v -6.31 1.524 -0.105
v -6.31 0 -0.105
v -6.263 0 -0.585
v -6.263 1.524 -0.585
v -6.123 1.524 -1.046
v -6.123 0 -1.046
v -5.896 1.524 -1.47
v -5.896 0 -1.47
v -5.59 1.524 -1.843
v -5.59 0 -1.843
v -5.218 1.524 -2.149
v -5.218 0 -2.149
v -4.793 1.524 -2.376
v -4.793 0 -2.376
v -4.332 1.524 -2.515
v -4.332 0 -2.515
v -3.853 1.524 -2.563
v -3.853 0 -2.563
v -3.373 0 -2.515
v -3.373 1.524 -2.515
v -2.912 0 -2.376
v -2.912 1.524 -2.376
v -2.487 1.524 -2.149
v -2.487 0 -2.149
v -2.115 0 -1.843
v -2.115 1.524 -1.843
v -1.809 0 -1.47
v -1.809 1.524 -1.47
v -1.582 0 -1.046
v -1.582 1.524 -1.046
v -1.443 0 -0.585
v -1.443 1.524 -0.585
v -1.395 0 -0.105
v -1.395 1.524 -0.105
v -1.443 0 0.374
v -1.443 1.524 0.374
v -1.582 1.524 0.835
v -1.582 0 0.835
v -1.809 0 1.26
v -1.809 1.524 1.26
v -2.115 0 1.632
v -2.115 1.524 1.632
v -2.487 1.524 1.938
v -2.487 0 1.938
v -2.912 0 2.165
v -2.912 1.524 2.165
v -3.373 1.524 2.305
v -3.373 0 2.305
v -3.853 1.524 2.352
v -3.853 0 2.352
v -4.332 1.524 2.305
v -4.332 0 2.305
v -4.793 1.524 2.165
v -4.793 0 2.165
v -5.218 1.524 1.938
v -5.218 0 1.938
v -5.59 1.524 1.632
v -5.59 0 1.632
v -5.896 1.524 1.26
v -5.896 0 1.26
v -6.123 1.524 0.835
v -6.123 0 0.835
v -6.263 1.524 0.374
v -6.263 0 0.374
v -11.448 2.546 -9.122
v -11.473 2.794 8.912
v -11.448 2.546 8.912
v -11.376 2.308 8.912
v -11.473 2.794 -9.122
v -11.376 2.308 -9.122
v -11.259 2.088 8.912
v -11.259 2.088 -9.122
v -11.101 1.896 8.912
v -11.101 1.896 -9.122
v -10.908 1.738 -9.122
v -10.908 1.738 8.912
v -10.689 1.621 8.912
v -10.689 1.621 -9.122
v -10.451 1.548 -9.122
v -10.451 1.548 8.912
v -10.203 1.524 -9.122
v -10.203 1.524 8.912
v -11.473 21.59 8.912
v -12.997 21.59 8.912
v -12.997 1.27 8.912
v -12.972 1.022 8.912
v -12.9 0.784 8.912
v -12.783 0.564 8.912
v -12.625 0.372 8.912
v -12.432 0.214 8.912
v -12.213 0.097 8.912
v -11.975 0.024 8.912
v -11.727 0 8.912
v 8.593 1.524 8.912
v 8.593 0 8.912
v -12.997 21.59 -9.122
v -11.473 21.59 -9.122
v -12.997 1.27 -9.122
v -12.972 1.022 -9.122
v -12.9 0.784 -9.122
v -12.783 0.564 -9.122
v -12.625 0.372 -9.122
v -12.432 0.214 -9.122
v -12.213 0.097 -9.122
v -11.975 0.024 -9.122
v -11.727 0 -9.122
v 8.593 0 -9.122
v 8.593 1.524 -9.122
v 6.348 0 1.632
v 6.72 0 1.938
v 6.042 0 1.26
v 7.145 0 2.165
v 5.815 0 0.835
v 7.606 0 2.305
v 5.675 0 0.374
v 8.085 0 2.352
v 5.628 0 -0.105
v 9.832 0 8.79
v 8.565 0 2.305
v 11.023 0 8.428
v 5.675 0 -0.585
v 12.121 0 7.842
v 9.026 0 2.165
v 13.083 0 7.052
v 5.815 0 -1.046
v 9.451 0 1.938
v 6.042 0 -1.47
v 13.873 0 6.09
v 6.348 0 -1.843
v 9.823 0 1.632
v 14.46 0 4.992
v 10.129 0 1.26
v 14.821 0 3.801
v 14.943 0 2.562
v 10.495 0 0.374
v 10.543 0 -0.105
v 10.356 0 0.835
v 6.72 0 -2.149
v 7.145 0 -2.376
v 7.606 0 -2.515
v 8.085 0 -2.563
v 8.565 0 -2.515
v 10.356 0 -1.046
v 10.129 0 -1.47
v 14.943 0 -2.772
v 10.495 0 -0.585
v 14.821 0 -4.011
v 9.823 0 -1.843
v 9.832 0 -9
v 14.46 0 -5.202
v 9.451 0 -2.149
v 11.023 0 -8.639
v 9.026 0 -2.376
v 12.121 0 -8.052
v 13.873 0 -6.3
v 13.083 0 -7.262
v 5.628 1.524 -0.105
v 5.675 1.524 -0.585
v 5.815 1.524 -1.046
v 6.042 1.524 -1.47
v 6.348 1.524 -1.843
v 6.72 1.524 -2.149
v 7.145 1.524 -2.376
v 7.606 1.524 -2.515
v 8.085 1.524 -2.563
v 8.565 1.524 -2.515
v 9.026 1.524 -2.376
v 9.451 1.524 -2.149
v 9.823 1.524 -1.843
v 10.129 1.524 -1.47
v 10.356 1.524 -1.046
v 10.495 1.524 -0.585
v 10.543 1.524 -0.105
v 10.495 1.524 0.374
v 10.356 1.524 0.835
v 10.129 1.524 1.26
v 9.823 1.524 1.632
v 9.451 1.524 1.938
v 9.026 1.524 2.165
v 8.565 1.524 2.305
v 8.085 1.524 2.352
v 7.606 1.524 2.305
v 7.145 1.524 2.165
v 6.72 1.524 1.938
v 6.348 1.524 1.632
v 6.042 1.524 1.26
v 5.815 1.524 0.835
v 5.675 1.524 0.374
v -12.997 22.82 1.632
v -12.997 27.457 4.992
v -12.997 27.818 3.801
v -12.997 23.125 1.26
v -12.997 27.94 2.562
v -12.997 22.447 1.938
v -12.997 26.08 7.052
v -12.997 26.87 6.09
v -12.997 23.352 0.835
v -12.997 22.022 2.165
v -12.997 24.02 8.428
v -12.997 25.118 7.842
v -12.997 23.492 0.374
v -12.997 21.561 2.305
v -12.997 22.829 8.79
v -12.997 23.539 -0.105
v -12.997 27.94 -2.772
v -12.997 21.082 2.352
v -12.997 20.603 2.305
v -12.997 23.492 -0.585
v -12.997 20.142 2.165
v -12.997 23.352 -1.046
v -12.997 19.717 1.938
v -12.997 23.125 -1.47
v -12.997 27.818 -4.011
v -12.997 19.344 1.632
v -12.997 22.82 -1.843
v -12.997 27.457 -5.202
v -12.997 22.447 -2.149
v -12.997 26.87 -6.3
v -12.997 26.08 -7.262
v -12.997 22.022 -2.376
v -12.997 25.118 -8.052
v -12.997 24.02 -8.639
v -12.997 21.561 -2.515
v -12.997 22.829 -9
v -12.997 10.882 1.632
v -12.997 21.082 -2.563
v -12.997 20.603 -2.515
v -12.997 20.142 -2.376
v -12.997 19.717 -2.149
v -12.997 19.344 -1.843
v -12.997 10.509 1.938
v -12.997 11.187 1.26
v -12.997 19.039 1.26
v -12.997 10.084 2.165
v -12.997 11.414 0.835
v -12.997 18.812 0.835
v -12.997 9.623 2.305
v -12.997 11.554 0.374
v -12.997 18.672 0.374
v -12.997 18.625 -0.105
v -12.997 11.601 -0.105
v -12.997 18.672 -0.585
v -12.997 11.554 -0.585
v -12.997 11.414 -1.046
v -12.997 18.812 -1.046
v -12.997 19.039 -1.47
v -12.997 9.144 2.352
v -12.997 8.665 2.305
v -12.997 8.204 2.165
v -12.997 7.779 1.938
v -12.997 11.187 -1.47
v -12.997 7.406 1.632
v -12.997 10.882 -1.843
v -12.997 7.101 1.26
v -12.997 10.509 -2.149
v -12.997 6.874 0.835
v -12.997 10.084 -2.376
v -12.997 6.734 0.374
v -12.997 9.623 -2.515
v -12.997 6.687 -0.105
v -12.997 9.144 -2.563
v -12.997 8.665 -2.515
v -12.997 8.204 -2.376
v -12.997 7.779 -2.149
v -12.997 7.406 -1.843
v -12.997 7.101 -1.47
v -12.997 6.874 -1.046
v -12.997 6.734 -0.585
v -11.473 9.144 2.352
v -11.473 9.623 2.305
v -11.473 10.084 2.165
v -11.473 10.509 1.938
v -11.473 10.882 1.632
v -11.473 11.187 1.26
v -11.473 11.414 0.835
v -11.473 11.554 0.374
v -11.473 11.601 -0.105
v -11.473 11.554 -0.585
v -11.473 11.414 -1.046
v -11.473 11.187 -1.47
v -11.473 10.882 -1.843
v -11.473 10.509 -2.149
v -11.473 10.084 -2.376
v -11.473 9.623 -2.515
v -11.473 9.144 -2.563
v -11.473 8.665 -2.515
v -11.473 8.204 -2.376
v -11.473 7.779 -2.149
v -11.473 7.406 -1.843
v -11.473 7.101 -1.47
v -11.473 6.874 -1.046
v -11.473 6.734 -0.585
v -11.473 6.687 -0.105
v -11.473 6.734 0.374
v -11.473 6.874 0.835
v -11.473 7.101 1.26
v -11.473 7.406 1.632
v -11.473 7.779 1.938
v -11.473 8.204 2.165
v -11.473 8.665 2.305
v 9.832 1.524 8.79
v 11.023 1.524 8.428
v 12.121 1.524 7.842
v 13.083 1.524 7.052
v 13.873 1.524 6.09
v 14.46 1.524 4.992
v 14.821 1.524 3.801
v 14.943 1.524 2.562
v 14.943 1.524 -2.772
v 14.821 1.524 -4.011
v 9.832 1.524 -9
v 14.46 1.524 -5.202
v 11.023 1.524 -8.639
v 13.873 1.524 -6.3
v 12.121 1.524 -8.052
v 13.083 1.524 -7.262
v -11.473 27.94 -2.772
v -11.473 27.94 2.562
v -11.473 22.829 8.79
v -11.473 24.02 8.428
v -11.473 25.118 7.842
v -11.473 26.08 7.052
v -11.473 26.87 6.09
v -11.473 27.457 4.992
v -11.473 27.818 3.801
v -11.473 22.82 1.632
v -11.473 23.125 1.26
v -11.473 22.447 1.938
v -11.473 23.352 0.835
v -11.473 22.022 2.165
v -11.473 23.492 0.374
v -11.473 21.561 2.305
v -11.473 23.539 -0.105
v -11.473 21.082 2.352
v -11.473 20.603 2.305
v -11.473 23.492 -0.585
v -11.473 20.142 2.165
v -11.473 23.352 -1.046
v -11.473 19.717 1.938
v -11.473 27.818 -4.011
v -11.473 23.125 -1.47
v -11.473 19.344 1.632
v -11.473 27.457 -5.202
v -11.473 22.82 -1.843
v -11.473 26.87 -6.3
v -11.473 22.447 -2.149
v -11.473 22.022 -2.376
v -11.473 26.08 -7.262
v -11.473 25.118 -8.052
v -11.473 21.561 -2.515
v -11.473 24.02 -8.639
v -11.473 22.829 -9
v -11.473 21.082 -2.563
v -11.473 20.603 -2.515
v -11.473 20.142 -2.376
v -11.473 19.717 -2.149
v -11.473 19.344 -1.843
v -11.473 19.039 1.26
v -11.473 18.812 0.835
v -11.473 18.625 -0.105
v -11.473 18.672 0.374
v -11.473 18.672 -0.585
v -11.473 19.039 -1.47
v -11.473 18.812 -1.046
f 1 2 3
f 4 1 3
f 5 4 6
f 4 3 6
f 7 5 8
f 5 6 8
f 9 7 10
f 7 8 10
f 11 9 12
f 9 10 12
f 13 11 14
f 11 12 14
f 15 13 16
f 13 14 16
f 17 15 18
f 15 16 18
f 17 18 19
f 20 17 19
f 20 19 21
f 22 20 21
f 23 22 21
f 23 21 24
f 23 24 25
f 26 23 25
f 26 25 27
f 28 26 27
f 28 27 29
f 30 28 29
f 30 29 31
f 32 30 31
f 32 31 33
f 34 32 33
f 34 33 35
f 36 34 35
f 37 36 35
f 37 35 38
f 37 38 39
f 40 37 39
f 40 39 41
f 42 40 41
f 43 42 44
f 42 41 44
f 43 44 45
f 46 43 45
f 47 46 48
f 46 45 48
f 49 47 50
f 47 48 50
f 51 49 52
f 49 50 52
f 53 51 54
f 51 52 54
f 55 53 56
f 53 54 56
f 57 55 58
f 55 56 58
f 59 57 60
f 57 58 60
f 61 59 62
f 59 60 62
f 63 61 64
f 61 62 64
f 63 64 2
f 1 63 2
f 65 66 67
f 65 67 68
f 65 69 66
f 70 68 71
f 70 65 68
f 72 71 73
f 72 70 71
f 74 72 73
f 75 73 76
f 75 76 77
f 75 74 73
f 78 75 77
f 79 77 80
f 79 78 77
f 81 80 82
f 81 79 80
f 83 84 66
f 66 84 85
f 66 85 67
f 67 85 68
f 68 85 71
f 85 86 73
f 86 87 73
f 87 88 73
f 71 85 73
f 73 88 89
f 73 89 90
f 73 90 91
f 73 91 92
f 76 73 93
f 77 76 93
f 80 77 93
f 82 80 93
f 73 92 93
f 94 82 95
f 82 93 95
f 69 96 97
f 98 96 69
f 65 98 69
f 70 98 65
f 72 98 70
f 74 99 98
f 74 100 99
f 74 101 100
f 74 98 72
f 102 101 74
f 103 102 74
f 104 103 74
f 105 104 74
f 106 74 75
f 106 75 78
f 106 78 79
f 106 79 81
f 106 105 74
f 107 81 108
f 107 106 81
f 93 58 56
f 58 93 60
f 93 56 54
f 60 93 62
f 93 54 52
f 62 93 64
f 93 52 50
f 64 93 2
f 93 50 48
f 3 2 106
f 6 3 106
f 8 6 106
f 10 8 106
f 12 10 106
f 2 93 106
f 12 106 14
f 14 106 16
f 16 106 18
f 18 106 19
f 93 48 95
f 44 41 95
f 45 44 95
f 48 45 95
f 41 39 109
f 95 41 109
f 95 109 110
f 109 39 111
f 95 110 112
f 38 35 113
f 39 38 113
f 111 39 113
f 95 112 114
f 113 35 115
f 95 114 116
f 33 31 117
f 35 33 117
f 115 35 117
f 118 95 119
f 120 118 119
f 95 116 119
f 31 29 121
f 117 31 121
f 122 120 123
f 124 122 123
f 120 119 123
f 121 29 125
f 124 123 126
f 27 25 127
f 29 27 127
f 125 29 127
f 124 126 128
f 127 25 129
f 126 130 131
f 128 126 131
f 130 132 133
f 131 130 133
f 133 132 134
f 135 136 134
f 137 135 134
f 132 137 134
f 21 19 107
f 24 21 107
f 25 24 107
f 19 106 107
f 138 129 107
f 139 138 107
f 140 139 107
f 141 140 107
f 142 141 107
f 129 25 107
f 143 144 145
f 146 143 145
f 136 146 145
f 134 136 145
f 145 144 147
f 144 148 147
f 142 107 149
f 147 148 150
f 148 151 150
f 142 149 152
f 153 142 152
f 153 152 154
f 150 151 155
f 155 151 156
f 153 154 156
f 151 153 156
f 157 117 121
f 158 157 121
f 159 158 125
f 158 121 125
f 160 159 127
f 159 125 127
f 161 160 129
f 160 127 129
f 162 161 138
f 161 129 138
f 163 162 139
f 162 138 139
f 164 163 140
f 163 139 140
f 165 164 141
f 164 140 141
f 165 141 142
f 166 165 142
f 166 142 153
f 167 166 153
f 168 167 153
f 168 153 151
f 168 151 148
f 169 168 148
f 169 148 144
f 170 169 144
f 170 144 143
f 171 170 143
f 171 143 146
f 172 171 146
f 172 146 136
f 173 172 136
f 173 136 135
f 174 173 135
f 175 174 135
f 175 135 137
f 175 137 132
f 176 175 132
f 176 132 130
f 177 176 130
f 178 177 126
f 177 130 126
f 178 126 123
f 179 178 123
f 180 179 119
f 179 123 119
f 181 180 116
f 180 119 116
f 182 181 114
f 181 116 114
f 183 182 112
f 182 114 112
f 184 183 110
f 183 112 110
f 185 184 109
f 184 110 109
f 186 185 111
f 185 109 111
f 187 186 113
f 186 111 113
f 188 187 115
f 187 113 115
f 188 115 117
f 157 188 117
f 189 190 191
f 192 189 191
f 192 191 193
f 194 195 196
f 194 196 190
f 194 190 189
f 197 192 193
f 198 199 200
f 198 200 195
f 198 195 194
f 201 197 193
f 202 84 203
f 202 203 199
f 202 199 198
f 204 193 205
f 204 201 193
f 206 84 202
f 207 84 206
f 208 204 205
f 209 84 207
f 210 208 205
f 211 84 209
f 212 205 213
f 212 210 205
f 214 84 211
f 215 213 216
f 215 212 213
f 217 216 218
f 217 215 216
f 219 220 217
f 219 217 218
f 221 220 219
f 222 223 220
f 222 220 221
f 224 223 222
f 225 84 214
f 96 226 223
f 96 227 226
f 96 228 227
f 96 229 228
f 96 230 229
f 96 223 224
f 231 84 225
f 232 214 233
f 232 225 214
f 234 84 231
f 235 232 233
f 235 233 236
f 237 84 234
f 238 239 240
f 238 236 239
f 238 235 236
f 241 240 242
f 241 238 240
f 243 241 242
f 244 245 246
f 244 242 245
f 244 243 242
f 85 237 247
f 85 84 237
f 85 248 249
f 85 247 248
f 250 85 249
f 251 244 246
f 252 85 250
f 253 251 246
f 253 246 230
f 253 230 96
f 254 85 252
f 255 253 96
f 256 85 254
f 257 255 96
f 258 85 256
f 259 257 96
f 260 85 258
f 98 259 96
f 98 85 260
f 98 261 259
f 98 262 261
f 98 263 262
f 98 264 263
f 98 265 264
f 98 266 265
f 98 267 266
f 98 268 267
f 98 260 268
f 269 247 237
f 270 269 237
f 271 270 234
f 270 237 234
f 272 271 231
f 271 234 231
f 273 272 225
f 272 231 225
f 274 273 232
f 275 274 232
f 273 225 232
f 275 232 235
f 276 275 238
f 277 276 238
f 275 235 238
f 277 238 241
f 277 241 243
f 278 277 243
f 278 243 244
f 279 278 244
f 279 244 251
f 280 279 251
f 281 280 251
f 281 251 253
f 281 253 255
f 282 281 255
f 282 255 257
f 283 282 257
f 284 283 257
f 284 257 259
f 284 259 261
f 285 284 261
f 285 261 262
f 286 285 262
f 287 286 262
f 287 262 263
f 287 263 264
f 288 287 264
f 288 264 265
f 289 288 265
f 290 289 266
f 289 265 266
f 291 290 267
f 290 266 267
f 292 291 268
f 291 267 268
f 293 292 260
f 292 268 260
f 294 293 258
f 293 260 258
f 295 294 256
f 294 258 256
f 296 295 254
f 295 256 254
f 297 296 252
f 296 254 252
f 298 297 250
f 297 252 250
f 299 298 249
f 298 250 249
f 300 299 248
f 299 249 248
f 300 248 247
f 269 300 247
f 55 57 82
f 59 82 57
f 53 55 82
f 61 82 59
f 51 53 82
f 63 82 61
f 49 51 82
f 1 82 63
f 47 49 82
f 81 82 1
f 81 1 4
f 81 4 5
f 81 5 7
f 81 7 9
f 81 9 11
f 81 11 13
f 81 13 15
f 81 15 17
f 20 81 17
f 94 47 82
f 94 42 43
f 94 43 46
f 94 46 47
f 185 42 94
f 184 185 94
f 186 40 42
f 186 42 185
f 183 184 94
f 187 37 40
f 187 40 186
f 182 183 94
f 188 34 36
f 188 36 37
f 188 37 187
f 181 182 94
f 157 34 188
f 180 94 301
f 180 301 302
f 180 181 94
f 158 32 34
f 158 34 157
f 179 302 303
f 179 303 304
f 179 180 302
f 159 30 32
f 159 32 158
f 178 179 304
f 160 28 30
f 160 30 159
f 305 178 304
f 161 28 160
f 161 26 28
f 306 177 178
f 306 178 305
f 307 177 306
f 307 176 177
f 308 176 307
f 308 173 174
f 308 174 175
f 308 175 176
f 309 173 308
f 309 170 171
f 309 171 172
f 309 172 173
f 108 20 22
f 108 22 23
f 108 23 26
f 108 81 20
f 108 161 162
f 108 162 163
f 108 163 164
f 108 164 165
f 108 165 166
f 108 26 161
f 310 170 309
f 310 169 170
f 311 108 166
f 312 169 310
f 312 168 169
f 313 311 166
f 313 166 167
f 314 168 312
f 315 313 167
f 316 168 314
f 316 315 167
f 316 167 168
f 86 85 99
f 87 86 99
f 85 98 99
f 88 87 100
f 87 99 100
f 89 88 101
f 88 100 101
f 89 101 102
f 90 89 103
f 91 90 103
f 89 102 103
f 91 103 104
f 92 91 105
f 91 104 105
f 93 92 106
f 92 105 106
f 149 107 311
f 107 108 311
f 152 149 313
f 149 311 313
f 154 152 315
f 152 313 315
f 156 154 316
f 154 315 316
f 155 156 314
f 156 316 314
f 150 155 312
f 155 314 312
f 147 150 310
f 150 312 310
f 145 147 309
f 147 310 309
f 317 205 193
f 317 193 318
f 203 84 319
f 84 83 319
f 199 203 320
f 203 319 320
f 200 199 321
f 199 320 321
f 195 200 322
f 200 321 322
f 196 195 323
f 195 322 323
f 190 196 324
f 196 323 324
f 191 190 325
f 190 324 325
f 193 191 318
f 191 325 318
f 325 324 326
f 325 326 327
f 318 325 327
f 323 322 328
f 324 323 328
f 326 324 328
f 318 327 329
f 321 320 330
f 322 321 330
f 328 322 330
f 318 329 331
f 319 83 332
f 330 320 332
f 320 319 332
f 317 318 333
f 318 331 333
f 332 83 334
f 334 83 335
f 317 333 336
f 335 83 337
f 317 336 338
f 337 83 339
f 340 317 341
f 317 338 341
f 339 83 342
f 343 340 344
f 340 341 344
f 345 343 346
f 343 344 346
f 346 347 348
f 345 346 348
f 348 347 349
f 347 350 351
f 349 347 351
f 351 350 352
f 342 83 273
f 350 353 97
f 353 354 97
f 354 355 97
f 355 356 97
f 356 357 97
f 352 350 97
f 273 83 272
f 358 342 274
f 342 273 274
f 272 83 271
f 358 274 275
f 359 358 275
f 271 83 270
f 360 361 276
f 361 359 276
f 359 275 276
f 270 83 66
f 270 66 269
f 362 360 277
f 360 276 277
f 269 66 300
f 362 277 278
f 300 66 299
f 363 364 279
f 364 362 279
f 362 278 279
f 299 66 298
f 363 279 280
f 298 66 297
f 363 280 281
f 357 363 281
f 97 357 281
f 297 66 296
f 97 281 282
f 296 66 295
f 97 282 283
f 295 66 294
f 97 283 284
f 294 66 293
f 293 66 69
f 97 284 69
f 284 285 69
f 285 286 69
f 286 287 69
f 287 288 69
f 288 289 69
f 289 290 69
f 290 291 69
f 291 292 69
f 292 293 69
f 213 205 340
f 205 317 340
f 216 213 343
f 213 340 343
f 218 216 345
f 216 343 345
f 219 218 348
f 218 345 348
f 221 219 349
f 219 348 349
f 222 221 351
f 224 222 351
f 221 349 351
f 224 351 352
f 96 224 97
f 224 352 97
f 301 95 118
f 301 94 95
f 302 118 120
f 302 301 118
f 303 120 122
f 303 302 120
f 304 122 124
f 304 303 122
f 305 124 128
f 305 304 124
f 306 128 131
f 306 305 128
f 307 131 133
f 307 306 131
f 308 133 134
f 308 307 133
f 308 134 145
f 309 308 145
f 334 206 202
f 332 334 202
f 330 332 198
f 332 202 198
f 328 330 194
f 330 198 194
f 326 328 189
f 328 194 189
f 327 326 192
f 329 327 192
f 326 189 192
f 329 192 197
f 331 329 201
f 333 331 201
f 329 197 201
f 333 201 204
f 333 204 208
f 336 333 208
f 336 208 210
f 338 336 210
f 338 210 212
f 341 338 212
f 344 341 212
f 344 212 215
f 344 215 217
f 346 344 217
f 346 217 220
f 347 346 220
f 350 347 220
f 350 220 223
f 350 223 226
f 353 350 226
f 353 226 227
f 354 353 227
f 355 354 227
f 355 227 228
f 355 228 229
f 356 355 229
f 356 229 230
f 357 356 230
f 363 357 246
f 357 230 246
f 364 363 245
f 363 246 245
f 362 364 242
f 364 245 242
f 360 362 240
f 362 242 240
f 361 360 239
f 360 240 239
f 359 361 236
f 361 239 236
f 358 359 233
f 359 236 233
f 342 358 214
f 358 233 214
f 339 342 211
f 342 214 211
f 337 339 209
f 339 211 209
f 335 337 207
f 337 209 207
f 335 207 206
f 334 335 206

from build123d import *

# Parameters (mm, degrees)
SKETCH1_W                        = 26.416
SKETCH1_H                        = 18.034
BOSS_EXTRUDE2_DEPTH              = 1.524
SKETCH1_4_W                      = 1.524
SKETCH1_4_H                      = 18.034
BOSS_EXTRUDE3_DEPTH              = 27.94
FILLET1_R                        = 1.27
FILLET2_R                        = 6.35
F_10_0_1935_DIAMETER_HOLE1_D     = 4.9149
F_10_0_1935_DIAMETER_HOLE1_DEPTH = 5.08
F_10_0_1935_DIAMETER_HOLE1_TIP   = 1.476584928
F_10_0_1935_DIAMETER_HOLE2_D     = 4.9149
F_10_0_1935_DIAMETER_HOLE2_DEPTH = 5.08
F_10_0_1935_DIAMETER_HOLE2_TIP   = 1.476584928


with BuildPart() as part:
    # Sketch1 → Boss-Extrude2 (new body)
    with BuildSketch(Plane(origin=(0, 0, 0), x_dir=(1, 0, 0), z_dir=(0, 1, 0))):
        with Locations((1.735252818, 0.105208004)):
            Rectangle(SKETCH1_W, SKETCH1_H)
    extrude(amount=BOSS_EXTRUDE2_DEPTH)

    # Sketch1<4> → Boss-Extrude3 (add)
    with BuildSketch(Plane(origin=(0, 0, 0), x_dir=(1, 0, 0), z_dir=(0, 1, 0))):
        with Locations((-12.234747182, 0.105208004)):
            Rectangle(SKETCH1_4_W, SKETCH1_4_H)
    extrude(amount=BOSS_EXTRUDE3_DEPTH)

    # Fillet1
    fillet1_edges = [part.edges().sort_by_distance(p)[0] for p in [
        (-12.996747182, 0, -0.105208004),
        (-11.472747182, 1.524, -0.105208004),
    ]]
    fillet(fillet1_edges, radius=FILLET1_R)

    # Fillet2
    fillet2_edges = [part.edges().sort_by_distance(p)[0] for p in [
        (-12.234747182, 27.94, -9.122208004),
        (-12.234747182, 27.94, 8.911791996),
        (14.943252818, 0.762, 8.911791996),
        (14.943252818, 0.762, -9.122208004),
    ]]
    fillet(fillet2_edges, radius=FILLET2_R)

    # #10 (0.1935) Diameter Hole1
    with Locations(Plane(origin=(0, 1.524, 0), x_dir=(1, 0, 0), z_dir=(0, 1, 0))):
        with Locations((-3.852747182, 0.105208004), (8.085252818, 0.105208004)):
            Hole(F_10_0_1935_DIAMETER_HOLE1_D / 2, depth=F_10_0_1935_DIAMETER_HOLE1_DEPTH)
            with Locations((0, 0, -(F_10_0_1935_DIAMETER_HOLE1_DEPTH + F_10_0_1935_DIAMETER_HOLE1_TIP / 2))):  # 118° drill point
                Cone(0, F_10_0_1935_DIAMETER_HOLE1_D / 2, F_10_0_1935_DIAMETER_HOLE1_TIP, mode=Mode.SUBTRACT)

    # #10 (0.1935) Diameter Hole2
    with Locations(Plane(origin=(-11.472747182, 0, 0), x_dir=(0, 0, -1), z_dir=(1, 0, 0))):
        with Locations((0.105208004, 9.144), (0.105208004, 21.082)):
            Hole(F_10_0_1935_DIAMETER_HOLE2_D / 2, depth=F_10_0_1935_DIAMETER_HOLE2_DEPTH)
            with Locations((0, 0, -(F_10_0_1935_DIAMETER_HOLE2_DEPTH + F_10_0_1935_DIAMETER_HOLE2_TIP / 2))):  # 118° drill point
                Cone(0, F_10_0_1935_DIAMETER_HOLE2_D / 2, F_10_0_1935_DIAMETER_HOLE2_TIP, mode=Mode.SUBTRACT)


solid = part.part
